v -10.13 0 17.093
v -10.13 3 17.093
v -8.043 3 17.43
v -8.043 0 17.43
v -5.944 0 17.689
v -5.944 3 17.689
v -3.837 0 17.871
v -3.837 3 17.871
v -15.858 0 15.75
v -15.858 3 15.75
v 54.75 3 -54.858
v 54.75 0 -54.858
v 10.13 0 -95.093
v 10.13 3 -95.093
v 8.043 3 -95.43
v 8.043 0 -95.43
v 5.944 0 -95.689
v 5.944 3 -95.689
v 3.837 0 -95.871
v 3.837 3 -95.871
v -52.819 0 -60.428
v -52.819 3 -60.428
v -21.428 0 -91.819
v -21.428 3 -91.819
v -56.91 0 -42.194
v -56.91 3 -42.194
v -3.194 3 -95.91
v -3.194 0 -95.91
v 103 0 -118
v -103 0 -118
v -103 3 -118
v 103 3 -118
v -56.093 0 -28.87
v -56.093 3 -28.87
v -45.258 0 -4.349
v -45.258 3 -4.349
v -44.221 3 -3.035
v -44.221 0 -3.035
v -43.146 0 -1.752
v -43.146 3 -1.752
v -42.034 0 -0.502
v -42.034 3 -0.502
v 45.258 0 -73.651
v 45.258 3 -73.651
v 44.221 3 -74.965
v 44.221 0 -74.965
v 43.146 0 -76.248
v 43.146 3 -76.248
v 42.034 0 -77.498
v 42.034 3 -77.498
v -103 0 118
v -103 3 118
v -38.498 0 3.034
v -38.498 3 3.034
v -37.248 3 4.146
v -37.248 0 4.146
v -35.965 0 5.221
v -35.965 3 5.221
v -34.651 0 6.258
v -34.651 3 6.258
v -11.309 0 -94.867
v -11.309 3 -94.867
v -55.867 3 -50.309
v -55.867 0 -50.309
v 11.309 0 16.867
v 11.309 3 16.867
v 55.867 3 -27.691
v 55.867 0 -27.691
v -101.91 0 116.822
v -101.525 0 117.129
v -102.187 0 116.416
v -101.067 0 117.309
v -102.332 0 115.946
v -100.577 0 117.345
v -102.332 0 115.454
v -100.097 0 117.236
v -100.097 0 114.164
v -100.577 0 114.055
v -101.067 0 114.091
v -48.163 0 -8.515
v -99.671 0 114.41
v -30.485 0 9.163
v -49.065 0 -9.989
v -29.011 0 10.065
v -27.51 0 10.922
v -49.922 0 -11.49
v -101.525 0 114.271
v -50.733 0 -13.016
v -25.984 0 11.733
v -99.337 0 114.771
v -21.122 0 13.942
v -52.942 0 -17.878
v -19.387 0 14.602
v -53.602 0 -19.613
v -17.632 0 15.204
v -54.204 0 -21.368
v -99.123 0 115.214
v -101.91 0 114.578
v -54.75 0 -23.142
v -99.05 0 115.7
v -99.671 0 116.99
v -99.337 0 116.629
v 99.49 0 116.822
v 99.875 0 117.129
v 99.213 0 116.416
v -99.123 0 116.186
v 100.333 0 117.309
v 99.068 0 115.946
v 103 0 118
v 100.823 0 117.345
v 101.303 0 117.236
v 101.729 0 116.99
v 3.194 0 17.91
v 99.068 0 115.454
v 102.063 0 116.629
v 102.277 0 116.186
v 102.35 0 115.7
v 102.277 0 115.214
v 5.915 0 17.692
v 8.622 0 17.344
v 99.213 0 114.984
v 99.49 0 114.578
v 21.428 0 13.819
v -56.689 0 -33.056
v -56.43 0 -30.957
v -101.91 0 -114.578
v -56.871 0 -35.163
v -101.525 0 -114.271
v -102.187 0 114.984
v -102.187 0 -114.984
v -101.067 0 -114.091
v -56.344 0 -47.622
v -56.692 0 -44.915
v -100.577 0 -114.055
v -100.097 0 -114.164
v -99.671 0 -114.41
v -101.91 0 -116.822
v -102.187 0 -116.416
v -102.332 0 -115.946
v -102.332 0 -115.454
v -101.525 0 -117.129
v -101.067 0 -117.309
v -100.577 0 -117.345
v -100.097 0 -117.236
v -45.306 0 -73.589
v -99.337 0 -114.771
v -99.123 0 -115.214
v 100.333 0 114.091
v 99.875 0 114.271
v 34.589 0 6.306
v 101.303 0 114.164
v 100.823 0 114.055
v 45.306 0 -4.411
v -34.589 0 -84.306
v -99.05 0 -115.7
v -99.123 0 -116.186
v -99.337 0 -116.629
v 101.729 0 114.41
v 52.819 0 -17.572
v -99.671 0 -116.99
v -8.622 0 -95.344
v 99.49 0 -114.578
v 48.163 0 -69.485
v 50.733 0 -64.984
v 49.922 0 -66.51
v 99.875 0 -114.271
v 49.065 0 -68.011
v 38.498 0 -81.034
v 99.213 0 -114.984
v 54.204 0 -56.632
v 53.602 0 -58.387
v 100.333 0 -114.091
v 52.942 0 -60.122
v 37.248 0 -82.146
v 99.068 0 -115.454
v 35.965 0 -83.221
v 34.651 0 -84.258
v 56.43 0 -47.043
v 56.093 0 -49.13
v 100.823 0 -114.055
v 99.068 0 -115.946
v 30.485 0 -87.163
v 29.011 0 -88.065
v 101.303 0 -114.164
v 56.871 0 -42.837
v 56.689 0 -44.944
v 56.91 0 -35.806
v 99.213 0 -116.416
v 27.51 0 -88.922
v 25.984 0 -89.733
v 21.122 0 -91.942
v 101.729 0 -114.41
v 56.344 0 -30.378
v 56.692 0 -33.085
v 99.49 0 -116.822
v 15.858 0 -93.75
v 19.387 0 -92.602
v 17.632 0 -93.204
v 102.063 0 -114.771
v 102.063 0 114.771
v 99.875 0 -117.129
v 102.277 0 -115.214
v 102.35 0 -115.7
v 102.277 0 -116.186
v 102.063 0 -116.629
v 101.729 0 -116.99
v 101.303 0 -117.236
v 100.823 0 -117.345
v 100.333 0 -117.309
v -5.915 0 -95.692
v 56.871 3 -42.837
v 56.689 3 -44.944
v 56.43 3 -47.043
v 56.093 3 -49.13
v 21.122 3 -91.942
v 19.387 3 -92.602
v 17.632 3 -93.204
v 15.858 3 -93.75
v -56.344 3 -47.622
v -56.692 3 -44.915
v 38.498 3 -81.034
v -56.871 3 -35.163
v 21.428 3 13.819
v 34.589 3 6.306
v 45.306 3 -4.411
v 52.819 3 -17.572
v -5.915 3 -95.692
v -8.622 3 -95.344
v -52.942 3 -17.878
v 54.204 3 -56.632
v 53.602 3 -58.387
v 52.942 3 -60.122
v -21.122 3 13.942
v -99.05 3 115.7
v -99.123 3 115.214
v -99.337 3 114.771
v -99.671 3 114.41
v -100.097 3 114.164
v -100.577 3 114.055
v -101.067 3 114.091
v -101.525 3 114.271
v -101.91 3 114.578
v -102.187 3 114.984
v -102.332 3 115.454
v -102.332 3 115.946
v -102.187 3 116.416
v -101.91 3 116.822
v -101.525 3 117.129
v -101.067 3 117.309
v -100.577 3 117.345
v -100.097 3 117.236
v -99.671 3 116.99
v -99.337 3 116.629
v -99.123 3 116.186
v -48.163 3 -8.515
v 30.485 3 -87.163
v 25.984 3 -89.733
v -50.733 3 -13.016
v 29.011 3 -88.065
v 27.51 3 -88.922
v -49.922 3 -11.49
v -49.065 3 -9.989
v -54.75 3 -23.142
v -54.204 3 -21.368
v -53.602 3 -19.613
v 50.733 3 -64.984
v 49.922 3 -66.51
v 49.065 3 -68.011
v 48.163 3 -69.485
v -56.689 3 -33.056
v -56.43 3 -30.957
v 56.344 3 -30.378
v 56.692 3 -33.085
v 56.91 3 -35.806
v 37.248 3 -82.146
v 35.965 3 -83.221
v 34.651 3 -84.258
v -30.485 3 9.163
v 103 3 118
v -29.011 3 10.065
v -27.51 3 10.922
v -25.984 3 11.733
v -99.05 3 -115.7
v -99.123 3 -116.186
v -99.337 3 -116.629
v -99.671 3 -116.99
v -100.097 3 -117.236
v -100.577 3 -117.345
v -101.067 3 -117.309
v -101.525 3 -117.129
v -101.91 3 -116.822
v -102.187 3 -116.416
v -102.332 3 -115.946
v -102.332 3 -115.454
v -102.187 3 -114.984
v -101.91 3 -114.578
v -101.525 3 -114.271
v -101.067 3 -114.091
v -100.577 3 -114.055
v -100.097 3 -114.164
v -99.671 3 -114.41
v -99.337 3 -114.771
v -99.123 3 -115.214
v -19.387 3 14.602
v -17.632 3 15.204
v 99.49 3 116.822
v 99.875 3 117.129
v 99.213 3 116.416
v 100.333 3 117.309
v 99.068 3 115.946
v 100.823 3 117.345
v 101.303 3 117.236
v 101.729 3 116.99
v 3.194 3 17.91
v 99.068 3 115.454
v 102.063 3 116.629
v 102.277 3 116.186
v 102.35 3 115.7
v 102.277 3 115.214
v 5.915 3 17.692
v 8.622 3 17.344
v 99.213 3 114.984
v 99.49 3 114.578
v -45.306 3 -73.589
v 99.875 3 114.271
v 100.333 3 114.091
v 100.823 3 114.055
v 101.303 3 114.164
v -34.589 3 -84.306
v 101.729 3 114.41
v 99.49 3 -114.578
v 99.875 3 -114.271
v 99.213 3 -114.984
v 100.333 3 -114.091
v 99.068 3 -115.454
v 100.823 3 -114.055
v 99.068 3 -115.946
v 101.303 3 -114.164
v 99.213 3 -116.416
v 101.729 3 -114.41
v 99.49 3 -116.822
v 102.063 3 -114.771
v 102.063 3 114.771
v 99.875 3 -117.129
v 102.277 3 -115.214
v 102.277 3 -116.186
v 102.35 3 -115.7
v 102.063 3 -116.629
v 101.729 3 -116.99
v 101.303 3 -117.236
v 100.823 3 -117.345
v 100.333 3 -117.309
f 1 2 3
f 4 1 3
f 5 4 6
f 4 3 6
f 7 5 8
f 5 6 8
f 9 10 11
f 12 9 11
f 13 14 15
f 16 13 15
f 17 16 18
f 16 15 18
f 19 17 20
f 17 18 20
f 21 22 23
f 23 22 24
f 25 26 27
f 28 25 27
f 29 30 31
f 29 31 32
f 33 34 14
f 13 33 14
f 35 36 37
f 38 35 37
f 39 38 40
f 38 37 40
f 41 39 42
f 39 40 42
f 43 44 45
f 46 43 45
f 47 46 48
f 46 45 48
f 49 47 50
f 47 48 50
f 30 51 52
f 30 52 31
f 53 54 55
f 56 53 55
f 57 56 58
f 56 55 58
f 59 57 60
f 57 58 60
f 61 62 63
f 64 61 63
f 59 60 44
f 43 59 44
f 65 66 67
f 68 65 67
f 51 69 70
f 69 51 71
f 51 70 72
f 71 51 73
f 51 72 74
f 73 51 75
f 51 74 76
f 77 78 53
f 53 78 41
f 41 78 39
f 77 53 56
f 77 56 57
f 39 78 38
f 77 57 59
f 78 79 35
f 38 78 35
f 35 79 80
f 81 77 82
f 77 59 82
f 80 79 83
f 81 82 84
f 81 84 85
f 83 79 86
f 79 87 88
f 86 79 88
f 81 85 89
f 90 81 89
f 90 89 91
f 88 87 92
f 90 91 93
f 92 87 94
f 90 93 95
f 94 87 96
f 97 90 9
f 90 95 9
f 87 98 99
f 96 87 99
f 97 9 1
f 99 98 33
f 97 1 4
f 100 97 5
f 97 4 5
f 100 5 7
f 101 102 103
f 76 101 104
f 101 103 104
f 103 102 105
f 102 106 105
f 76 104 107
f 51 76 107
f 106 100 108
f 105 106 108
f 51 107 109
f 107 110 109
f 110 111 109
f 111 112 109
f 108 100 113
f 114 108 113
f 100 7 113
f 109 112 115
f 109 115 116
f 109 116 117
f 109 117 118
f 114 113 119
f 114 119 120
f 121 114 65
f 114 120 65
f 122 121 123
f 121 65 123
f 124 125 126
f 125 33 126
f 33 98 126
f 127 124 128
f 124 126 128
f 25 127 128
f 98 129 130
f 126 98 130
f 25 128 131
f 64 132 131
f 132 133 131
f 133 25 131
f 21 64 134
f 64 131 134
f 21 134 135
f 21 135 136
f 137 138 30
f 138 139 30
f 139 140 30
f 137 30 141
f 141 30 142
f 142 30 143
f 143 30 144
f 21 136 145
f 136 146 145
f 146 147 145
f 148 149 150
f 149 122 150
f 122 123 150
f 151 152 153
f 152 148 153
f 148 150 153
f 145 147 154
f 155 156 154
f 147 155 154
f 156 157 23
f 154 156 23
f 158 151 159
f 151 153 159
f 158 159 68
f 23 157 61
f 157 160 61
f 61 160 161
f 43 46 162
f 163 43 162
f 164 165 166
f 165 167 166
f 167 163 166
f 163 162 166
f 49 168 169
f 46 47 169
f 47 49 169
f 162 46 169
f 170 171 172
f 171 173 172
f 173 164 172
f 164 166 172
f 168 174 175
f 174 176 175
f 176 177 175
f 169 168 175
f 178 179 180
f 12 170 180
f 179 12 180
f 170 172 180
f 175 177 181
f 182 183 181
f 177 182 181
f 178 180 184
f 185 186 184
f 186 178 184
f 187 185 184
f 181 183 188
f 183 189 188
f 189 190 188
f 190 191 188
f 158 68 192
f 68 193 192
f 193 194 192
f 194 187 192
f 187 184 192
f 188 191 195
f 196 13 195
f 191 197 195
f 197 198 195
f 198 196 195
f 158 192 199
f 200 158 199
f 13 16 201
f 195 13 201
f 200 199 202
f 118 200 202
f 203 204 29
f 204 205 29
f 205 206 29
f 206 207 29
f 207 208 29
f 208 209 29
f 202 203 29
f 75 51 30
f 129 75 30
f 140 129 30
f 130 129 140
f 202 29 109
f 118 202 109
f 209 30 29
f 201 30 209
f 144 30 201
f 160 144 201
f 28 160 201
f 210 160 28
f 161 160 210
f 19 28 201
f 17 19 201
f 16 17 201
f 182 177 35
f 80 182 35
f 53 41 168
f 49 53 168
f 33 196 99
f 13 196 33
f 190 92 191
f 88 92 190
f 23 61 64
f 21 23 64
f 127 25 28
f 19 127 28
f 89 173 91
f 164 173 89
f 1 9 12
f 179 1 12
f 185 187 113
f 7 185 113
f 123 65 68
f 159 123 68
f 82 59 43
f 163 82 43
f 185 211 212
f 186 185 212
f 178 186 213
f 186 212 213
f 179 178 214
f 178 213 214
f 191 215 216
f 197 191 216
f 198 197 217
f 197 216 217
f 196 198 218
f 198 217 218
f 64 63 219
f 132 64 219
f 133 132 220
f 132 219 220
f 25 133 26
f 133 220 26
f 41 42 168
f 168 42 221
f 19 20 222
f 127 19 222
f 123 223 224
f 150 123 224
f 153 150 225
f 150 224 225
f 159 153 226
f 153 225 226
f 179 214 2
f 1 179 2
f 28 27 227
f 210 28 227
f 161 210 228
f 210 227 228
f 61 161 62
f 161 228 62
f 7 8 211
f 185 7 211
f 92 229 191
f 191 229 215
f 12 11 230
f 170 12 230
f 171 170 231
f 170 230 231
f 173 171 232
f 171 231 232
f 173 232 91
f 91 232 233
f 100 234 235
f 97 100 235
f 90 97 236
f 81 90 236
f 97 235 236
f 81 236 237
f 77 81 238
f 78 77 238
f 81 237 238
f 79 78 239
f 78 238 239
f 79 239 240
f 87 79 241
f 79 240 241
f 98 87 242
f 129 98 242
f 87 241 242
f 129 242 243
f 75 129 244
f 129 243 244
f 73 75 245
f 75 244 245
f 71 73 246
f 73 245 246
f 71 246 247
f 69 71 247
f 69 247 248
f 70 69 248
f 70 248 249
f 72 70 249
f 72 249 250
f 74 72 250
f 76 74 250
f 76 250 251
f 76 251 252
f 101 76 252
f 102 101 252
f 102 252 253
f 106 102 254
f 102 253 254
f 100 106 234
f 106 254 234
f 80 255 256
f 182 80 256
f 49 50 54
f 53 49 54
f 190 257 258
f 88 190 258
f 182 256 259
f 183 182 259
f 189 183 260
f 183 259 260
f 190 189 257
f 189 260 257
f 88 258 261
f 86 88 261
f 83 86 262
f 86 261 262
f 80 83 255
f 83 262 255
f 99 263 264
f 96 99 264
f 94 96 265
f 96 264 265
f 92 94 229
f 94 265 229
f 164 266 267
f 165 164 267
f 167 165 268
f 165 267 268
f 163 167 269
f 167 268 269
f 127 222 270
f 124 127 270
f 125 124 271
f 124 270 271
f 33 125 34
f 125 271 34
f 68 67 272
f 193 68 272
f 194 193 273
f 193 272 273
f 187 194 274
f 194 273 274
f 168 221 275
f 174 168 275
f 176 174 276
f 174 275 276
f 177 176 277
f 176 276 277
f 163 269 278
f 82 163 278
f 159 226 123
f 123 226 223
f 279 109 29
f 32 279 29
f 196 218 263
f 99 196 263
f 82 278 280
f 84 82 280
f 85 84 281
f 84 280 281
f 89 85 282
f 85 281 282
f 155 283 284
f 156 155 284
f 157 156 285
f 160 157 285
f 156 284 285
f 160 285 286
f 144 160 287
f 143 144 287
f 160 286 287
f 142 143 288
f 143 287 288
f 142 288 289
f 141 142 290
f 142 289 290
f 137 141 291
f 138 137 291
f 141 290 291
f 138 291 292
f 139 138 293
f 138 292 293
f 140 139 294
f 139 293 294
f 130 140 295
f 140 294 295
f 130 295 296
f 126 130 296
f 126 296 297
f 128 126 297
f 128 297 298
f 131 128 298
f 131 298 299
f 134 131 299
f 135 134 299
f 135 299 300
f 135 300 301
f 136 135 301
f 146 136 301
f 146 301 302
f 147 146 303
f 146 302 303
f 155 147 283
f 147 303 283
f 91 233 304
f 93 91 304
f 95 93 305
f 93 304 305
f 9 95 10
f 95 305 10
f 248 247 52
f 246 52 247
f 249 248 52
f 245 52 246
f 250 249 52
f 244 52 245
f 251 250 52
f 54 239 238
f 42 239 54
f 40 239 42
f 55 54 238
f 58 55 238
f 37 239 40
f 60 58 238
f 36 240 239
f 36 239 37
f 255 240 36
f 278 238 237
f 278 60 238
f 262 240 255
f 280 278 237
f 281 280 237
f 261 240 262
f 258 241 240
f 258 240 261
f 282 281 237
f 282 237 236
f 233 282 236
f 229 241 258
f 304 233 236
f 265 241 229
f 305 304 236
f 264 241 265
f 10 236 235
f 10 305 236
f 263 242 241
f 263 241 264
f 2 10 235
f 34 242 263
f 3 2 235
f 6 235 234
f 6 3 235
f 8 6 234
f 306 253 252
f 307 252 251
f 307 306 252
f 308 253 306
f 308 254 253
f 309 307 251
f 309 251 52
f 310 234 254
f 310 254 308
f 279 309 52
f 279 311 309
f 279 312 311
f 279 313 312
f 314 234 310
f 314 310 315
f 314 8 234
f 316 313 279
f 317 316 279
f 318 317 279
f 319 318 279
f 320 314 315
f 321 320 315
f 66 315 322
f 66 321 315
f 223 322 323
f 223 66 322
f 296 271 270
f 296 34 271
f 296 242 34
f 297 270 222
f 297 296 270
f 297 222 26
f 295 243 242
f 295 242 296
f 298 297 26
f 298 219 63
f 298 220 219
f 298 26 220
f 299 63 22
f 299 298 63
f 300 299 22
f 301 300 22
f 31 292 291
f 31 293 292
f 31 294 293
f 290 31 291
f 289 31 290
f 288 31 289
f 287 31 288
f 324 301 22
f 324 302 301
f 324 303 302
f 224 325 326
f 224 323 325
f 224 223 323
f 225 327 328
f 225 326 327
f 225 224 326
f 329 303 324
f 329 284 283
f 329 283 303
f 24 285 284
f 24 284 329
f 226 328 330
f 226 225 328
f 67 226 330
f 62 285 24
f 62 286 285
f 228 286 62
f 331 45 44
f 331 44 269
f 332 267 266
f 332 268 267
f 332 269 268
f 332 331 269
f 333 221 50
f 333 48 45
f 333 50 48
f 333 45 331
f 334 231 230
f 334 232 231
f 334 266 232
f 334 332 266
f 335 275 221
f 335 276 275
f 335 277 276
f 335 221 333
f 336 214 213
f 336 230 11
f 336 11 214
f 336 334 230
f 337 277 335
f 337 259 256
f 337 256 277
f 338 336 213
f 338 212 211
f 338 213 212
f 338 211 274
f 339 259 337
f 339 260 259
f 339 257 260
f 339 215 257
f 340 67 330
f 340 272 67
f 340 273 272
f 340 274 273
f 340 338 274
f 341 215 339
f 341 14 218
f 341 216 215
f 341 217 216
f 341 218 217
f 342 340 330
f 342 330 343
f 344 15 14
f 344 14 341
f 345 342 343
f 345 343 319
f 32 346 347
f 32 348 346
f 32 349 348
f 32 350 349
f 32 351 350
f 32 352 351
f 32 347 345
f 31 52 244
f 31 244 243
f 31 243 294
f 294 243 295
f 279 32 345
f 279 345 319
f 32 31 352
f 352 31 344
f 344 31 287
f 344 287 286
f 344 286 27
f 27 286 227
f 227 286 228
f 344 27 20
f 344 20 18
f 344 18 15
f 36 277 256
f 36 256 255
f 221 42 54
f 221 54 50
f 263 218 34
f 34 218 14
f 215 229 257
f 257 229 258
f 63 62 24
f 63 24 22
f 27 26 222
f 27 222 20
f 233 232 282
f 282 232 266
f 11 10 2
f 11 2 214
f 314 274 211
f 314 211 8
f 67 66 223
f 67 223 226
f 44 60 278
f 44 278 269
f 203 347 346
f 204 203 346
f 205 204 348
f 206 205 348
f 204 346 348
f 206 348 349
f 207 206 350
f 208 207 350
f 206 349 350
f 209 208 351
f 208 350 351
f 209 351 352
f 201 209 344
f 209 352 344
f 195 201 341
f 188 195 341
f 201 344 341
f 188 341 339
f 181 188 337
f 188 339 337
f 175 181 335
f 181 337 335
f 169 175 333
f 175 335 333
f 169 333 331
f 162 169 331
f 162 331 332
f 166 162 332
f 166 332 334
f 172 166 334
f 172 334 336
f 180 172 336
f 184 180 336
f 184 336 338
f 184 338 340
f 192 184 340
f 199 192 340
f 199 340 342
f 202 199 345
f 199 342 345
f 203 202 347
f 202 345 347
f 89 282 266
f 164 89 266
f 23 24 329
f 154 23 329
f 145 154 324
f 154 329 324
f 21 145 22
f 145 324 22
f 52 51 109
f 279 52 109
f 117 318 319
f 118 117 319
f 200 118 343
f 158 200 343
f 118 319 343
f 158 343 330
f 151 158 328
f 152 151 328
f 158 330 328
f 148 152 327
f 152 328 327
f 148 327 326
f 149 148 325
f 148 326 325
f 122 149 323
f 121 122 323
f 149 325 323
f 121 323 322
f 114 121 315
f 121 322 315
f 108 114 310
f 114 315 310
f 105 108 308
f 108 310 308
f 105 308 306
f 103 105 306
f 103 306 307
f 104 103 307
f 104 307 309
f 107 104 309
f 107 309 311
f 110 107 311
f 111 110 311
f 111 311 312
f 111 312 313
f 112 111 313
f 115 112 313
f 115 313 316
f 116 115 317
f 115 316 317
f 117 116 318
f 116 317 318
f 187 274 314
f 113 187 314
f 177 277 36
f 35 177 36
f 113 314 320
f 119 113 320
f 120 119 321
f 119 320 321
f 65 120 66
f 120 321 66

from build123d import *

# Parameters (mm, degrees)
SKIZZE1_W                       = 206
SKIZZE1_H                       = 236
AUFSATZ_LINEAR_AUSTRAGEN1_DEPTH = 3
SCHNITT_LINEAR_AUSTRAGEN2_DEPTH = 3
SKIZZE3_R                       = 1.65
SCHNITT_LINEAR_AUSTRAGEN3_DEPTH = 3


with BuildPart() as part:
    # Skizze1 → Aufsatz-Linear austragen1 (new body)
    with BuildSketch(Plane(origin=(0, 0, 0), x_dir=(1, 0, 0), z_dir=(0, 1, 0))):
        Rectangle(SKIZZE1_W, SKIZZE1_H)
    extrude(amount=AUFSATZ_LINEAR_AUSTRAGEN1_DEPTH)

    # Skizze2 → Schnitt-Linear austragen2 (cut)
    with BuildSketch(Plane(origin=(0, 3, 0), x_dir=(1, 0, 0), z_dir=(0, 1, 0))):
        with BuildLine():
            ThreePointArc((-21.427553093, 91.819125025), (-40.305086528, 79.305086528), (-52.819125025, 60.427553093))
            Line((-52.819125025, 60.427553093), (-21.427553093, 91.819125025))
        make_face()
        with BuildLine():
            ThreePointArc((-55.866928677, 50.30868163), (-56.534459002, 46.27014067), (-56.910435609, 42.194106886))
            Line((-56.910435609, 42.194106886), (-3.194106886, 95.910435609))
            ThreePointArc((-3.194106886, 95.910435609), (-7.27014067, 95.534459002), (-11.30868163, 94.866928677))
            Line((-11.30868163, 94.866928677), (-55.866928677, 50.30868163))
        make_face()
        with BuildLine():
            ThreePointArc((-56.870693274, 35.162781409), (-56.569218878, 32.005468167), (-56.092595564, 28.869811308))
            Line((-56.092595564, 28.869811308), (10.130188692, 95.092595564))
            ThreePointArc((10.130188692, 95.092595564), (6.994531833, 95.569218878), (3.837218591, 95.870693274))
            Line((3.837218591, 95.870693274), (-56.870693274, 35.162781409))
        make_face()
        with BuildLine():
            ThreePointArc((-54.749577763, 23.141761296), (-53.910125432, 20.487885699), (-52.942116187, 17.878155061))
            Line((-52.942116187, 17.878155061), (21.121844939, 91.942116187))
            ThreePointArc((21.121844939, 91.942116187), (18.512114301, 92.910125432), (15.858238704, 93.749577763))
            Line((15.858238704, 93.749577763), (-54.749577763, 23.141761296))
        make_face()
        with BuildLine():
            ThreePointArc((-50.733032764, 13.016170672), (-49.499198499, 10.736430728), (-48.162990305, 8.515145319))
            Line((-48.162990305, 8.515145319), (30.484854681, 87.162990305))
            ThreePointArc((30.484854681, 87.162990305), (28.263569272, 88.499198499), (25.983829328, 89.733032764))
            Line((25.983829328, 89.733032764), (-50.733032764, 13.016170672))
        make_face()
        with BuildLine():
            ThreePointArc((-45.258164778, 4.348903034), (-43.688596063, 2.389802322), (-42.034290815, 0.501709185))
            Line((-42.034290815, 0.501709185), (38.498290815, 81.034290815))
            ThreePointArc((38.498290815, 81.034290815), (36.610197678, 82.688596063), (34.651096966, 84.258164778))
            Line((34.651096966, 84.258164778), (-45.258164778, 4.348903034))
        make_face()
        with BuildLine():
            Line((42.034290815, 77.498290815), (-38.498290815, -3.034290815))
            ThreePointArc((-38.498290815, -3.034290815), (-36.610197678, -4.688596063), (-34.651096966, -6.258164778))
            Line((-34.651096966, -6.258164778), (45.258164778, 73.651096966))
            ThreePointArc((45.258164778, 73.651096966), (43.688596063, 75.610197678), (42.034290815, 77.498290815))
        make_face()
        with BuildLine():
            Line((48.162990305, 69.484854681), (-30.484854681, -9.162990305))
            ThreePointArc((-30.484854681, -9.162990305), (-28.263569272, -10.499198499), (-25.983829328, -11.733032764))
            Line((-25.983829328, -11.733032764), (50.733032764, 64.983829328))
            ThreePointArc((50.733032764, 64.983829328), (49.499198499, 67.263569272), (48.162990305, 69.484854681))
        make_face()
        with BuildLine():
            Line((52.942116187, 60.121844939), (-21.121844939, -13.942116187))
            ThreePointArc((-21.121844939, -13.942116187), (-18.512114301, -14.910125432), (-15.858238704, -15.749577763))
            Line((-15.858238704, -15.749577763), (54.749577763, 54.858238704))
            ThreePointArc((54.749577763, 54.858238704), (53.910125432, 57.512114301), (52.942116187, 60.121844939))
        make_face()
        with BuildLine():
            Line((56.092595564, 49.130188692), (-10.130188692, -17.092595564))
            ThreePointArc((-10.130188692, -17.092595564), (-6.994531833, -17.569218878), (-3.837218591, -17.870693274))
            Line((-3.837218591, -17.870693274), (56.870693274, 42.837218591))
            ThreePointArc((56.870693274, 42.837218591), (56.569218878, 45.994531833), (56.092595564, 49.130188692))
        make_face()
        with BuildLine():
            Line((56.910435609, 35.805893114), (3.194106886, -17.910435609))
            ThreePointArc((3.194106886, -17.910435609), (7.27014067, -17.534459002), (11.30868163, -16.866928677))
            Line((11.30868163, -16.866928677), (55.866928677, 27.69131837))
            ThreePointArc((55.866928677, 27.69131837), (56.534459002, 31.72985933), (56.910435609, 35.805893114))
        make_face()
        with BuildLine():
            Line((52.819125025, 17.572446907), (21.427553093, -13.819125025))
            ThreePointArc((21.427553093, -13.819125025), (40.305086528, -1.305086528), (52.819125025, 17.572446907))
        make_face()
    extrude(amount=-SCHNITT_LINEAR_AUSTRAGEN2_DEPTH, mode=Mode.SUBTRACT)

    # Skizze3 → Schnitt-Linear austragen3 (cut)
    with BuildSketch(Plane(origin=(0, 3, 0), x_dir=(1, 0, 0), z_dir=(0, 1, 0))):
        with Locations((-100.7, 115.7)):
            Circle(SKIZZE3_R)
        with Locations((100.7, 115.7)):
            Circle(SKIZZE3_R)
        with Locations((100.7, -115.7)):
            Circle(SKIZZE3_R)
        with Locations((-100.7, -115.7)):
            Circle(SKIZZE3_R)
    extrude(amount=-SCHNITT_LINEAR_AUSTRAGEN3_DEPTH, mode=Mode.SUBTRACT)


solid = part.part
